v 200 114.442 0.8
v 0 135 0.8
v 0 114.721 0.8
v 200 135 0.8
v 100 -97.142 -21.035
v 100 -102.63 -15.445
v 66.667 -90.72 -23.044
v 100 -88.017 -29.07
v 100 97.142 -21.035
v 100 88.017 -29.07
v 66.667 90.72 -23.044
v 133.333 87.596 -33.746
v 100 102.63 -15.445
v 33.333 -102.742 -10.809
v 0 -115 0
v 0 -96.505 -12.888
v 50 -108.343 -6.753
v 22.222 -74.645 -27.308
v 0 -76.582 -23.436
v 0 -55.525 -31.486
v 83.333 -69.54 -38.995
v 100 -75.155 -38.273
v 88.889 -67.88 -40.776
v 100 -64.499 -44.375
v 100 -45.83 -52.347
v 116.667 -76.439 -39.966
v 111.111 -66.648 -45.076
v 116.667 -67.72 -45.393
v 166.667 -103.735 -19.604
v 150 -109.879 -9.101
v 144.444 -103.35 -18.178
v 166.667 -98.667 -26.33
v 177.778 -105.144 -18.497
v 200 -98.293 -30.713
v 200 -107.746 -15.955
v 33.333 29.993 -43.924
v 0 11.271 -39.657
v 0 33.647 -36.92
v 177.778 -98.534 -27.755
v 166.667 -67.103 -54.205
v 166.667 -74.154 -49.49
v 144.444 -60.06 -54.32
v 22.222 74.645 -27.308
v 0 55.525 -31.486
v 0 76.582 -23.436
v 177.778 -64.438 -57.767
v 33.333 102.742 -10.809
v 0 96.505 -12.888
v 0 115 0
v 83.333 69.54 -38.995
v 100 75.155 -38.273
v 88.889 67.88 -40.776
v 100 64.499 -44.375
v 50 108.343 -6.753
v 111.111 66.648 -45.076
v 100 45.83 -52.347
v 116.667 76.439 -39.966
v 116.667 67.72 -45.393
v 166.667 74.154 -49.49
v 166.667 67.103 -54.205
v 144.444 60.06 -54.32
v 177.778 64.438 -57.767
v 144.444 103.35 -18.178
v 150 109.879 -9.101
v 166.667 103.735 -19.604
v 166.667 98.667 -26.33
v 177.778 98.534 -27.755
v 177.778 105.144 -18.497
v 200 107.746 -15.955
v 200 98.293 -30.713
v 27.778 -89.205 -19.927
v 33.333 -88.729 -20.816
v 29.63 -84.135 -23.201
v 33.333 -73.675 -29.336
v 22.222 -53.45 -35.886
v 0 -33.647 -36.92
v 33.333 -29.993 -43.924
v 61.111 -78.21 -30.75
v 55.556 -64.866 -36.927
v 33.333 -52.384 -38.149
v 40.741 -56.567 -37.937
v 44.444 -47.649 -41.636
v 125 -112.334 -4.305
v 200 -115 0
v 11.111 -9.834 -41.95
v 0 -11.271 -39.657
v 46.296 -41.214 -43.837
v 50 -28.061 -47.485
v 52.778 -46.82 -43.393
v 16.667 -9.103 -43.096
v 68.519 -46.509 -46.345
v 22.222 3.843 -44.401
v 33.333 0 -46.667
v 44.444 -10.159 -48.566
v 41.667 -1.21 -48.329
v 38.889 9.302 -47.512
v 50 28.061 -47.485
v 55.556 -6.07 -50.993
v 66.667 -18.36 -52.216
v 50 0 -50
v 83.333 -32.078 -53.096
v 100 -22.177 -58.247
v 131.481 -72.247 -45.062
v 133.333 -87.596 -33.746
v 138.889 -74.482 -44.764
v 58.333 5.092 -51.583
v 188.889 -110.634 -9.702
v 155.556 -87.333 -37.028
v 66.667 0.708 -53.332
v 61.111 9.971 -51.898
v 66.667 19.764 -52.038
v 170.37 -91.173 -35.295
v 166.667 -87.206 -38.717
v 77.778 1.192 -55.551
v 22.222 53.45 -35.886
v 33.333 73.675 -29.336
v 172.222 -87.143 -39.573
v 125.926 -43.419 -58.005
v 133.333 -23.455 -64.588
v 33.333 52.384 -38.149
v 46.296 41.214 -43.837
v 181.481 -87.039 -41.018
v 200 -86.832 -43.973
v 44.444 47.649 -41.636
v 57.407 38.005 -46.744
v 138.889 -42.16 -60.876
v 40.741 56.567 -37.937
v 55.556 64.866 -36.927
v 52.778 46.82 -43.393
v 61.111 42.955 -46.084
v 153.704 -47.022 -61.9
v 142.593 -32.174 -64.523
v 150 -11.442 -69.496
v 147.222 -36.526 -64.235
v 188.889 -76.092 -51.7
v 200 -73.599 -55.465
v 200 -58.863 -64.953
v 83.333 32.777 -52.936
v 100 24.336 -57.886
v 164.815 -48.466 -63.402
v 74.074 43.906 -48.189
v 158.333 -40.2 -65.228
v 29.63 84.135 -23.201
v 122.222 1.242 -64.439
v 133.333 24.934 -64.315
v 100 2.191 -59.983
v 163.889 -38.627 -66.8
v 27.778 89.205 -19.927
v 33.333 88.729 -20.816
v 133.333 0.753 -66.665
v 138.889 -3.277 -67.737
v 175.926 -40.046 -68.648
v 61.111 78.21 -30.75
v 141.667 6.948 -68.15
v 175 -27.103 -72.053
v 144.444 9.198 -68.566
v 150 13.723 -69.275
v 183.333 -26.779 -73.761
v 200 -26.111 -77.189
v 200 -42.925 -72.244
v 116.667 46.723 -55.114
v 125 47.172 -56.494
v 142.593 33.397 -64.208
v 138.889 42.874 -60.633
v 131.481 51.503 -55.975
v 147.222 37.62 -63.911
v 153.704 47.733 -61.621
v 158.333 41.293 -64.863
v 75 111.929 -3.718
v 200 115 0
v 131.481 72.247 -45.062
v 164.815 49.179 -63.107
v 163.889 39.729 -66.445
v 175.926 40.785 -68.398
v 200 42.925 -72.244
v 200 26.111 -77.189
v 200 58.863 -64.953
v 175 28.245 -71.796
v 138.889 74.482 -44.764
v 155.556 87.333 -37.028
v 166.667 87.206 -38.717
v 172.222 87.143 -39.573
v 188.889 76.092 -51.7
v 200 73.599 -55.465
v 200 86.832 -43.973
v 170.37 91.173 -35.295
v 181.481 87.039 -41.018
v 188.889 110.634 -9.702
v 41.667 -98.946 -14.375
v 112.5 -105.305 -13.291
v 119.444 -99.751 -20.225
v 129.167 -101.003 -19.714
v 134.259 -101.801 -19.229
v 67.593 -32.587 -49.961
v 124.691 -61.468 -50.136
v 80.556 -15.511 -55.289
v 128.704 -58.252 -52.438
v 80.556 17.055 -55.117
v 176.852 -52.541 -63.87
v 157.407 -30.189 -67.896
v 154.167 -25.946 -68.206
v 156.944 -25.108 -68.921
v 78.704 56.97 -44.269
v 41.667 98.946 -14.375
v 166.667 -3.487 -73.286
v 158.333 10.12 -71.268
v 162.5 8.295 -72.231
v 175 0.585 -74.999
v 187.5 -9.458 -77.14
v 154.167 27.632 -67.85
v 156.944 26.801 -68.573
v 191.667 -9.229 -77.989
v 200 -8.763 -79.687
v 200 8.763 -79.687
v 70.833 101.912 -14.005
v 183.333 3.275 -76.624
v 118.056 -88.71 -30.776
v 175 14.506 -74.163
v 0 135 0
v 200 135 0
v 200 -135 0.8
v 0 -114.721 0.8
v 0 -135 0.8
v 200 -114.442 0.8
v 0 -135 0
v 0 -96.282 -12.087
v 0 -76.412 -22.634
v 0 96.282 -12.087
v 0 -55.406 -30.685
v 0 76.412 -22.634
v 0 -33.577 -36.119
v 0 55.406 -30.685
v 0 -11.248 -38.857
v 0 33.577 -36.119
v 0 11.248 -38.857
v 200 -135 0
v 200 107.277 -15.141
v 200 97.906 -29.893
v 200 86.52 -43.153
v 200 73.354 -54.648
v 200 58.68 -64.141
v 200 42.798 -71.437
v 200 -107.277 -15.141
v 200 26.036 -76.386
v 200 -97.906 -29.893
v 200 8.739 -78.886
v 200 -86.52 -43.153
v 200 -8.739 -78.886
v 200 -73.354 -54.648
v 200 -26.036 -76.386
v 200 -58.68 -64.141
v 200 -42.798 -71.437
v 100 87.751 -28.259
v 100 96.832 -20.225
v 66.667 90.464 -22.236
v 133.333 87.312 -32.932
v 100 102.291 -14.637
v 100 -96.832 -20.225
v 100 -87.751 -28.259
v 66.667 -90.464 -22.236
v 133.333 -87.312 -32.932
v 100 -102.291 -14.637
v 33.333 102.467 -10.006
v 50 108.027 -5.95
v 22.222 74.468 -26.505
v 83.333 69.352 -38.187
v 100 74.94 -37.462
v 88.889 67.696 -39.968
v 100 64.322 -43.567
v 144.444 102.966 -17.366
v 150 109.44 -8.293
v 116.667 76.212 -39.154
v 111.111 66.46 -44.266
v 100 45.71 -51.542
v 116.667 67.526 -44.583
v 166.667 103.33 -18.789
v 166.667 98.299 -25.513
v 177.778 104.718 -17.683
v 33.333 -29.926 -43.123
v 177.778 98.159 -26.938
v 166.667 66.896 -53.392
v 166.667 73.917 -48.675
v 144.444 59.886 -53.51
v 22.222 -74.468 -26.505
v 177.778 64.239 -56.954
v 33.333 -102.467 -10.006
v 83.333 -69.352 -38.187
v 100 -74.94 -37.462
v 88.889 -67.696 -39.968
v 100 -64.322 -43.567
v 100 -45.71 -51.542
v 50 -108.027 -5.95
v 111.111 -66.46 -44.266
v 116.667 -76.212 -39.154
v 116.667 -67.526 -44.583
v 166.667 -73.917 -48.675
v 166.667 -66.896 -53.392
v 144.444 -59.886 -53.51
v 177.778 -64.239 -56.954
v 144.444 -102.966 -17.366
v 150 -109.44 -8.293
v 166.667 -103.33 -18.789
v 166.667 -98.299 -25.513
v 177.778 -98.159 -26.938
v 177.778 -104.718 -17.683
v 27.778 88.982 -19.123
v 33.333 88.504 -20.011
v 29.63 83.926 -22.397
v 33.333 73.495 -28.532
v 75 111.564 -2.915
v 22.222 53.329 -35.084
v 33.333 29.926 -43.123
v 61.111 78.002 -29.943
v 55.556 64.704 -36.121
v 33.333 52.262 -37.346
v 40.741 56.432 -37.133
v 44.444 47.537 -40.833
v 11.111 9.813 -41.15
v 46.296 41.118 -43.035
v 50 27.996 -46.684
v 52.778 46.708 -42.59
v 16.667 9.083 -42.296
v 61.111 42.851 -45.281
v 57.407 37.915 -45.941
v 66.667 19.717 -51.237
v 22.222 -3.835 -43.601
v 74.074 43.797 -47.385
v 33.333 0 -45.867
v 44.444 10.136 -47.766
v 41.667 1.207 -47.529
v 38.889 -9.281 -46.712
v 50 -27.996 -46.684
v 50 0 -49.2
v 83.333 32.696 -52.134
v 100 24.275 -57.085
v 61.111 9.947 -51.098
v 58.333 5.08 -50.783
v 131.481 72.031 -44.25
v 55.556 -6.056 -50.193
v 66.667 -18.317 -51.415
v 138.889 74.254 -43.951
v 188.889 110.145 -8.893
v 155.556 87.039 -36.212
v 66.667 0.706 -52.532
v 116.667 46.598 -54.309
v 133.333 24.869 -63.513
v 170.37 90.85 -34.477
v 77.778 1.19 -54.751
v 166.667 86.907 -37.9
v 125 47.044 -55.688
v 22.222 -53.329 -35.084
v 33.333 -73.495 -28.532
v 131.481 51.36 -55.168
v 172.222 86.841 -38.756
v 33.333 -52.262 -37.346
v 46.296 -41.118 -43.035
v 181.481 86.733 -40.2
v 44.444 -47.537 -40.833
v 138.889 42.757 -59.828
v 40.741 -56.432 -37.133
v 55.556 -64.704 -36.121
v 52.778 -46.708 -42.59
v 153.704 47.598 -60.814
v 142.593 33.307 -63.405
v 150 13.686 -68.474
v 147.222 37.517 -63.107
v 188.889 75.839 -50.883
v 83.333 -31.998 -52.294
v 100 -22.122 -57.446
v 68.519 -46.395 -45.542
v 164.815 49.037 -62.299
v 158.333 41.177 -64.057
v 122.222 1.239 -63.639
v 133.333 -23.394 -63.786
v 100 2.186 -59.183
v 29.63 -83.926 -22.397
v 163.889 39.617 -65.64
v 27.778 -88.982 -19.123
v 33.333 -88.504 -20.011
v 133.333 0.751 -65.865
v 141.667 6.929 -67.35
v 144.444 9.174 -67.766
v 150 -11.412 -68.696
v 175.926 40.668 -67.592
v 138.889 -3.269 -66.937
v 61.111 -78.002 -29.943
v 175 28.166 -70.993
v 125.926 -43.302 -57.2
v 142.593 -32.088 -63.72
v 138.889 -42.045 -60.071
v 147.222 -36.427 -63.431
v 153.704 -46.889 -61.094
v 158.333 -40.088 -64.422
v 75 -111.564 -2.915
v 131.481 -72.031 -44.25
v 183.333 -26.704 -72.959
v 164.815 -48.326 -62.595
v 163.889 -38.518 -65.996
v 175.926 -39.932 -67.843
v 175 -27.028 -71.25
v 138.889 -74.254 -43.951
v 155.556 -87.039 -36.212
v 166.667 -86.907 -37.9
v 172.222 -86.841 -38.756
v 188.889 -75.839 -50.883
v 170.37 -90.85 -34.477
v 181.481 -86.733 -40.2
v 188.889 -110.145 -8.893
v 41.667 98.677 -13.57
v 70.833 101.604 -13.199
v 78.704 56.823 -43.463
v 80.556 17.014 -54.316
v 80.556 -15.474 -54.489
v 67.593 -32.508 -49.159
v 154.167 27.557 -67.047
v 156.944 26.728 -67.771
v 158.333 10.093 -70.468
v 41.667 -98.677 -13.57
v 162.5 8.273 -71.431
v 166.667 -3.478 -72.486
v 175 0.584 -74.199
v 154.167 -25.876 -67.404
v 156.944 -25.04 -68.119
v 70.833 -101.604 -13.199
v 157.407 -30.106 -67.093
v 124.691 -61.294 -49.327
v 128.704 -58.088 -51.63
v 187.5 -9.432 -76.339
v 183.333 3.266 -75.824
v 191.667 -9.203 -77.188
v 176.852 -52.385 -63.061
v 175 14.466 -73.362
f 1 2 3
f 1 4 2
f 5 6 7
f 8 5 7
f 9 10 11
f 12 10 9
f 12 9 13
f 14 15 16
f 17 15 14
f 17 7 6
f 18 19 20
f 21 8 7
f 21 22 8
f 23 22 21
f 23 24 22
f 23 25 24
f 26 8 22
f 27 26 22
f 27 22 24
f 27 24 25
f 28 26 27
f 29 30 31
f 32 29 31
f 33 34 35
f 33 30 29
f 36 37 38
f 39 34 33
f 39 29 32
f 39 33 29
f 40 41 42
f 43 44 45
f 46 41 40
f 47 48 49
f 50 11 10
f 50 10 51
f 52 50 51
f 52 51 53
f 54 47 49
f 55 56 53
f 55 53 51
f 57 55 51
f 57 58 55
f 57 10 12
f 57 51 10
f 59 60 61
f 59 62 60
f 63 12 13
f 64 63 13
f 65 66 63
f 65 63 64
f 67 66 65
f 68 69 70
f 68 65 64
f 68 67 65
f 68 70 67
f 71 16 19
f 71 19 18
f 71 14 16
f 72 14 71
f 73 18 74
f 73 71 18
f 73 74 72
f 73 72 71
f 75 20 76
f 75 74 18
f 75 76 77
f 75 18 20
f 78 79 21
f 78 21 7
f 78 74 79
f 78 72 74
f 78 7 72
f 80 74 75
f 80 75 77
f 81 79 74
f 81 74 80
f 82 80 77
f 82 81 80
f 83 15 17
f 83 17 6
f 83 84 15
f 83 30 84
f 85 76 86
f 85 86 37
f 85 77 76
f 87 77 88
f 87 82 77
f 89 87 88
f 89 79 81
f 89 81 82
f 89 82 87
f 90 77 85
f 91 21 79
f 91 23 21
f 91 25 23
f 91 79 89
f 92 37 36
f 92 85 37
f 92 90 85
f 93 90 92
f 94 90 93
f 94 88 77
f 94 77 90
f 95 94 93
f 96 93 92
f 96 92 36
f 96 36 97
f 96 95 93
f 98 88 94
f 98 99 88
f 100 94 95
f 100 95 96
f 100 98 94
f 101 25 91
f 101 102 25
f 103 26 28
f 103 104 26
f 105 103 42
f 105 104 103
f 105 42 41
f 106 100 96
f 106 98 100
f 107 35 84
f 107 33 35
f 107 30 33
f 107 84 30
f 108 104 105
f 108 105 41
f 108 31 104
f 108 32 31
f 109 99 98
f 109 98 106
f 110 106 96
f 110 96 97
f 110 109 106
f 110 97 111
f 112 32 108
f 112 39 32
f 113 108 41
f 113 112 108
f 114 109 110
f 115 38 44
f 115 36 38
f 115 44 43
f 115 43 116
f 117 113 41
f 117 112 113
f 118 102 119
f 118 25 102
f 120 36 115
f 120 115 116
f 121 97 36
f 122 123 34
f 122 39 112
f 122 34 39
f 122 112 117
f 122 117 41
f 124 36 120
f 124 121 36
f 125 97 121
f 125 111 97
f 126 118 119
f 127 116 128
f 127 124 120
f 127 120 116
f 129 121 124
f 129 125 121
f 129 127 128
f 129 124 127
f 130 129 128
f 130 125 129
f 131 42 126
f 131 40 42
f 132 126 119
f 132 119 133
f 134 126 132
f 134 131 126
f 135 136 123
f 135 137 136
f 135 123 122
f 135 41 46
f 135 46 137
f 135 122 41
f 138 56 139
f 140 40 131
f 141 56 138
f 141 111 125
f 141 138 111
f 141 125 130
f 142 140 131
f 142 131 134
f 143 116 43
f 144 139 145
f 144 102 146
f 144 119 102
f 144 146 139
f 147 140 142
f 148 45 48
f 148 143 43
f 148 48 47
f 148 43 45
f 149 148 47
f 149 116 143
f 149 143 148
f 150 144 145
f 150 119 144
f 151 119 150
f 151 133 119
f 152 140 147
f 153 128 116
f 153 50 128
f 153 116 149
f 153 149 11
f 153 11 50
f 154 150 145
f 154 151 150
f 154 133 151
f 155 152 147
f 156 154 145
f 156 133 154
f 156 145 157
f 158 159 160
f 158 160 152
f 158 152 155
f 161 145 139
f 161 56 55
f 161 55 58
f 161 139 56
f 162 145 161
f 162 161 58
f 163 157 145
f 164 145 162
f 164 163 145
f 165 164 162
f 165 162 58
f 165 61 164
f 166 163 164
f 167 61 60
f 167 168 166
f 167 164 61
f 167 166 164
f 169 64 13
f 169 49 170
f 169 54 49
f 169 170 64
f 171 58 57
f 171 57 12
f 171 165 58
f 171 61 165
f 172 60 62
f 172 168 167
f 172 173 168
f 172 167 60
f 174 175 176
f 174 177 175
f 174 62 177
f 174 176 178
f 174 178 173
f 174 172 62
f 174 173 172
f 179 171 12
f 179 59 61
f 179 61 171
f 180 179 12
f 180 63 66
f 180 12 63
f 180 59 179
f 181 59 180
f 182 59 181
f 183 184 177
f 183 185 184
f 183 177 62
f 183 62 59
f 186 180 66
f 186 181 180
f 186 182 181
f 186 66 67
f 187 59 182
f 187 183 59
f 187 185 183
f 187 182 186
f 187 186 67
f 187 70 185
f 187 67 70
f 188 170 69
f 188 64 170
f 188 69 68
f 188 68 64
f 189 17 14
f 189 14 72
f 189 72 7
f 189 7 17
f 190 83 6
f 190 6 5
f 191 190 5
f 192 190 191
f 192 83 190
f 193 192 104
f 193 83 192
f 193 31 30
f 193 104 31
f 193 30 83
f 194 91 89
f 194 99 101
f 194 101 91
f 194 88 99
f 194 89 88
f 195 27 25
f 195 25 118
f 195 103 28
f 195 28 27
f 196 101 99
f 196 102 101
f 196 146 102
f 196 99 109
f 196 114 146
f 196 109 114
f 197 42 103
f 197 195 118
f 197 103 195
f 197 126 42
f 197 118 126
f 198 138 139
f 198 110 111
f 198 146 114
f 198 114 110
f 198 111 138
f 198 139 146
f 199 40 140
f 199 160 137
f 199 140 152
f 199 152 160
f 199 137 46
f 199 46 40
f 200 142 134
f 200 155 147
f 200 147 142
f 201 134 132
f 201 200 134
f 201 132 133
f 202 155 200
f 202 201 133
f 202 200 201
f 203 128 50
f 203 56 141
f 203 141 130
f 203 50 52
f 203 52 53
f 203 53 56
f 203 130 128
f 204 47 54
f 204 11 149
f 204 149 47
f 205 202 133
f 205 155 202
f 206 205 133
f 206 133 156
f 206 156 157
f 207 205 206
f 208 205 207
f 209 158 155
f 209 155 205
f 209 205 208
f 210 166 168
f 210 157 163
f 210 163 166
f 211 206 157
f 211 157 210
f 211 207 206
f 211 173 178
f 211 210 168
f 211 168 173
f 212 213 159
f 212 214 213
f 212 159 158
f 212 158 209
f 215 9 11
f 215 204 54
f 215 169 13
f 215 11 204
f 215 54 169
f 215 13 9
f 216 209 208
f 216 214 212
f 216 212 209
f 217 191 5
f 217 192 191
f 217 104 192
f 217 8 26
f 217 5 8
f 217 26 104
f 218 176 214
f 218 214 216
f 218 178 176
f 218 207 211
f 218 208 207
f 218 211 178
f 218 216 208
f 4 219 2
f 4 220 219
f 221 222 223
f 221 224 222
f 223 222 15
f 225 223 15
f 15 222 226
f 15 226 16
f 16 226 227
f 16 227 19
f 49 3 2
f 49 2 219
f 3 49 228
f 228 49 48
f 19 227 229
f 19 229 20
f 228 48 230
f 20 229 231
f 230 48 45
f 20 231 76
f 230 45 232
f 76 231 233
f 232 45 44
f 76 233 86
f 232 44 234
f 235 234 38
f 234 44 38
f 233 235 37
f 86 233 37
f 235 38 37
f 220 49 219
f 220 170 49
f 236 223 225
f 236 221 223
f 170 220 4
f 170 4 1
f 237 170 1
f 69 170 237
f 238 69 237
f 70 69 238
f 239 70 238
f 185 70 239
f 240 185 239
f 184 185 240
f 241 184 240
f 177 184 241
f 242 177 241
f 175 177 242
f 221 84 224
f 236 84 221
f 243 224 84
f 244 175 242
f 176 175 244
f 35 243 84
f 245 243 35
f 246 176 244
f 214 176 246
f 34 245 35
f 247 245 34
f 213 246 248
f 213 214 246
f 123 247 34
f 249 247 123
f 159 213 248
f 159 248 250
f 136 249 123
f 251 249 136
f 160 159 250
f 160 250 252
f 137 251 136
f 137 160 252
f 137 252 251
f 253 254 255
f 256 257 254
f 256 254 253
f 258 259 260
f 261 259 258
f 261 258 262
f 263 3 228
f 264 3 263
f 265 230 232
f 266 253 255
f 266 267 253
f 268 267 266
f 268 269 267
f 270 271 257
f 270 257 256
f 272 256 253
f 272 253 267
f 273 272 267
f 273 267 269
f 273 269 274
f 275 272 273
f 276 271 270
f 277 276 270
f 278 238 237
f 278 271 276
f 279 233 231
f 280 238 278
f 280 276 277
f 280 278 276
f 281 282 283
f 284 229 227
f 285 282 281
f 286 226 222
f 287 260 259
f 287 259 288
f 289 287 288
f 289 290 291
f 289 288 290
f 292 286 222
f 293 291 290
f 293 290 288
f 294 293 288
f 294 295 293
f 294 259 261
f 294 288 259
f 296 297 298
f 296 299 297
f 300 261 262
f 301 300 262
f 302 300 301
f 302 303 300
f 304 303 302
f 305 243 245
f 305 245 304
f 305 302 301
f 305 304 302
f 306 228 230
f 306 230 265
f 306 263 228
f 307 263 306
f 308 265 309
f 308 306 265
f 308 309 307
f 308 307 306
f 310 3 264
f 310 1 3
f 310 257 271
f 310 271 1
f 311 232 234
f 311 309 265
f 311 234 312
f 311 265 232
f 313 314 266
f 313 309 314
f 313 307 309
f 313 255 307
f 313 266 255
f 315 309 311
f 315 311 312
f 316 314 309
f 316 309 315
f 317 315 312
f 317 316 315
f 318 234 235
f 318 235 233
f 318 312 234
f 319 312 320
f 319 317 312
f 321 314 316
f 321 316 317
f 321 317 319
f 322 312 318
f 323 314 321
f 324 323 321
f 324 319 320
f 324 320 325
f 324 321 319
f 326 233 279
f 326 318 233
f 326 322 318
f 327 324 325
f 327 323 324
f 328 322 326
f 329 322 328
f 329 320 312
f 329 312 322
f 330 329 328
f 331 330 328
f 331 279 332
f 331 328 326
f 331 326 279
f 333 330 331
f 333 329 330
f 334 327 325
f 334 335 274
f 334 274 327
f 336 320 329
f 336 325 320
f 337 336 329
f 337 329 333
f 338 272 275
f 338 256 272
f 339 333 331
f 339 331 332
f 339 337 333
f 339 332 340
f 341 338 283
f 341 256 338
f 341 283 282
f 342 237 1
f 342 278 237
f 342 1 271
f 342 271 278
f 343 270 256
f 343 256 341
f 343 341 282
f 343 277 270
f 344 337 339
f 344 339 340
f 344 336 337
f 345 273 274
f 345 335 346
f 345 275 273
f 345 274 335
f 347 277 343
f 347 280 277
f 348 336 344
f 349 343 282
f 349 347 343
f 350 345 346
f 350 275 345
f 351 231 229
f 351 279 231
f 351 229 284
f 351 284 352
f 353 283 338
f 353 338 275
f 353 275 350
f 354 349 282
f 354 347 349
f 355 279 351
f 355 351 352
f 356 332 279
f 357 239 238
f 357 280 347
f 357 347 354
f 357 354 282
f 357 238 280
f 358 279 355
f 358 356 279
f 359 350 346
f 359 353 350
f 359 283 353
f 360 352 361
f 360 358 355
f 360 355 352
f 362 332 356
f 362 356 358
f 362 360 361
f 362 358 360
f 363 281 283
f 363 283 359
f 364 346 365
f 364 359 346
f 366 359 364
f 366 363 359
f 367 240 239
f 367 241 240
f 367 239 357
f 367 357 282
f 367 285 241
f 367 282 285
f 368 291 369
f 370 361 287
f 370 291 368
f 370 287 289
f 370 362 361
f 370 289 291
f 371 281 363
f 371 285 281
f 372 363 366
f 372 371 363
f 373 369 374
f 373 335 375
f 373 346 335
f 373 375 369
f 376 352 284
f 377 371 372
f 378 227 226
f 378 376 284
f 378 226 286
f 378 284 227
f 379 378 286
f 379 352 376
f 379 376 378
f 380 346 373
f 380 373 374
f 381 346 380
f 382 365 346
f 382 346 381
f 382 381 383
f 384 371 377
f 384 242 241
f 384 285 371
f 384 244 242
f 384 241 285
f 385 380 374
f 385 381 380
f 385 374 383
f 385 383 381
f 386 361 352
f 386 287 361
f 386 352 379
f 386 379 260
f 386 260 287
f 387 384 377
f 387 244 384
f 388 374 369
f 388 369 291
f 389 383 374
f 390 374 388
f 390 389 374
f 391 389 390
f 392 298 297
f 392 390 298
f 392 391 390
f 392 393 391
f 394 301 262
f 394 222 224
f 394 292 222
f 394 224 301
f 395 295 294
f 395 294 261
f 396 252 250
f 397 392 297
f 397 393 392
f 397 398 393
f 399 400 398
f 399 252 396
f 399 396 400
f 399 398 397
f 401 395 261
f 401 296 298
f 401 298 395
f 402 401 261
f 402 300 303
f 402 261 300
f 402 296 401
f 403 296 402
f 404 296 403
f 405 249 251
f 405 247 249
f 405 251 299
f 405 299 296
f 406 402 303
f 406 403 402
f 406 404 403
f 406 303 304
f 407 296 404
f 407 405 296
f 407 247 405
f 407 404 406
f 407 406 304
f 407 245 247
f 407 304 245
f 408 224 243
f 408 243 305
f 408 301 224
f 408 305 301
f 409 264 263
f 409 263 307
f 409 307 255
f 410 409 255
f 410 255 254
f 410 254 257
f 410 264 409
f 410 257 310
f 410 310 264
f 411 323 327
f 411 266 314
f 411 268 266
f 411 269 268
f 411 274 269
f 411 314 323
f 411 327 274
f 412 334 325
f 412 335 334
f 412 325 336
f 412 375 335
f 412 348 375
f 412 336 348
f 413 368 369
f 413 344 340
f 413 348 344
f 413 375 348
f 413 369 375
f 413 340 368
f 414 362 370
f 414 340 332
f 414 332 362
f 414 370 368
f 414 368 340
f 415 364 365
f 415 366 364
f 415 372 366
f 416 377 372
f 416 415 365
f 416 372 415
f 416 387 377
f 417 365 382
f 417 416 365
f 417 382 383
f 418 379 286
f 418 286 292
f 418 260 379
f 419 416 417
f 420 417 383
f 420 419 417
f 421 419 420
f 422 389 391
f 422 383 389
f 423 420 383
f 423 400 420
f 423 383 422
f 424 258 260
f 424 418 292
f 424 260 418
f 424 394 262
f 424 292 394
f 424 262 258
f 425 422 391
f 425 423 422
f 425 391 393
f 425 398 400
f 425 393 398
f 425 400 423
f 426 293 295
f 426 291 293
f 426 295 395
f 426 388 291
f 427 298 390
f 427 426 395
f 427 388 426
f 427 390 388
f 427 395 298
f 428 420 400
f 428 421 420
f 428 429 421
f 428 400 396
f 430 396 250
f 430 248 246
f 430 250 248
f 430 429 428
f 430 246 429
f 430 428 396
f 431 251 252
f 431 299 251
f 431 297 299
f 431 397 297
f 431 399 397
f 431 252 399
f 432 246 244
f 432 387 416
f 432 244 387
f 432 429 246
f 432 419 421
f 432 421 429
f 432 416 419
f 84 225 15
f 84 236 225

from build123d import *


with BuildPart() as f3:
    # F0 (on Right) → F3 section 0
    with BuildSketch(Plane.YZ):
        with BuildLine():
            Line((-135, 0), (-115, 0))
            ThreePointArc((-115, 0), (0, -40), (115, 0))
            Line((115, 0), (135, 0))
            Line((135, 0), (135, 0.8))
            Line((135, 0.8), (114.7214016651, 0.8))
            ThreePointArc((114.7214016651, 0.8), (0, -39.2), (-114.7214016651, 0.8))
            Line((-114.7214016651, 0.8), (-135, 0.8))
            Line((-135, 0.8), (-135, 0))
        make_face()
    # F2 (on offset) → F3 section 1
    with BuildSketch(Plane.YZ.offset(200)):
        with BuildLine():
            Line((-135, 0), (-115, 0))
            ThreePointArc((-115, 0), (0, -80), (115, 0))
            Line((115, 0), (135, 0))
            Line((135, 0), (135, 0.8))
            Line((135, 0.8), (114.4421251113, 0.8))
            ThreePointArc((114.4421251113, 0.8), (0, -79.2), (-114.4421251113, 0.8))
            Line((-114.4421251113, 0.8), (-135, 0.8))
            Line((-135, 0.8), (-135, 0))
        make_face()
    loft()


solid = f3.part
